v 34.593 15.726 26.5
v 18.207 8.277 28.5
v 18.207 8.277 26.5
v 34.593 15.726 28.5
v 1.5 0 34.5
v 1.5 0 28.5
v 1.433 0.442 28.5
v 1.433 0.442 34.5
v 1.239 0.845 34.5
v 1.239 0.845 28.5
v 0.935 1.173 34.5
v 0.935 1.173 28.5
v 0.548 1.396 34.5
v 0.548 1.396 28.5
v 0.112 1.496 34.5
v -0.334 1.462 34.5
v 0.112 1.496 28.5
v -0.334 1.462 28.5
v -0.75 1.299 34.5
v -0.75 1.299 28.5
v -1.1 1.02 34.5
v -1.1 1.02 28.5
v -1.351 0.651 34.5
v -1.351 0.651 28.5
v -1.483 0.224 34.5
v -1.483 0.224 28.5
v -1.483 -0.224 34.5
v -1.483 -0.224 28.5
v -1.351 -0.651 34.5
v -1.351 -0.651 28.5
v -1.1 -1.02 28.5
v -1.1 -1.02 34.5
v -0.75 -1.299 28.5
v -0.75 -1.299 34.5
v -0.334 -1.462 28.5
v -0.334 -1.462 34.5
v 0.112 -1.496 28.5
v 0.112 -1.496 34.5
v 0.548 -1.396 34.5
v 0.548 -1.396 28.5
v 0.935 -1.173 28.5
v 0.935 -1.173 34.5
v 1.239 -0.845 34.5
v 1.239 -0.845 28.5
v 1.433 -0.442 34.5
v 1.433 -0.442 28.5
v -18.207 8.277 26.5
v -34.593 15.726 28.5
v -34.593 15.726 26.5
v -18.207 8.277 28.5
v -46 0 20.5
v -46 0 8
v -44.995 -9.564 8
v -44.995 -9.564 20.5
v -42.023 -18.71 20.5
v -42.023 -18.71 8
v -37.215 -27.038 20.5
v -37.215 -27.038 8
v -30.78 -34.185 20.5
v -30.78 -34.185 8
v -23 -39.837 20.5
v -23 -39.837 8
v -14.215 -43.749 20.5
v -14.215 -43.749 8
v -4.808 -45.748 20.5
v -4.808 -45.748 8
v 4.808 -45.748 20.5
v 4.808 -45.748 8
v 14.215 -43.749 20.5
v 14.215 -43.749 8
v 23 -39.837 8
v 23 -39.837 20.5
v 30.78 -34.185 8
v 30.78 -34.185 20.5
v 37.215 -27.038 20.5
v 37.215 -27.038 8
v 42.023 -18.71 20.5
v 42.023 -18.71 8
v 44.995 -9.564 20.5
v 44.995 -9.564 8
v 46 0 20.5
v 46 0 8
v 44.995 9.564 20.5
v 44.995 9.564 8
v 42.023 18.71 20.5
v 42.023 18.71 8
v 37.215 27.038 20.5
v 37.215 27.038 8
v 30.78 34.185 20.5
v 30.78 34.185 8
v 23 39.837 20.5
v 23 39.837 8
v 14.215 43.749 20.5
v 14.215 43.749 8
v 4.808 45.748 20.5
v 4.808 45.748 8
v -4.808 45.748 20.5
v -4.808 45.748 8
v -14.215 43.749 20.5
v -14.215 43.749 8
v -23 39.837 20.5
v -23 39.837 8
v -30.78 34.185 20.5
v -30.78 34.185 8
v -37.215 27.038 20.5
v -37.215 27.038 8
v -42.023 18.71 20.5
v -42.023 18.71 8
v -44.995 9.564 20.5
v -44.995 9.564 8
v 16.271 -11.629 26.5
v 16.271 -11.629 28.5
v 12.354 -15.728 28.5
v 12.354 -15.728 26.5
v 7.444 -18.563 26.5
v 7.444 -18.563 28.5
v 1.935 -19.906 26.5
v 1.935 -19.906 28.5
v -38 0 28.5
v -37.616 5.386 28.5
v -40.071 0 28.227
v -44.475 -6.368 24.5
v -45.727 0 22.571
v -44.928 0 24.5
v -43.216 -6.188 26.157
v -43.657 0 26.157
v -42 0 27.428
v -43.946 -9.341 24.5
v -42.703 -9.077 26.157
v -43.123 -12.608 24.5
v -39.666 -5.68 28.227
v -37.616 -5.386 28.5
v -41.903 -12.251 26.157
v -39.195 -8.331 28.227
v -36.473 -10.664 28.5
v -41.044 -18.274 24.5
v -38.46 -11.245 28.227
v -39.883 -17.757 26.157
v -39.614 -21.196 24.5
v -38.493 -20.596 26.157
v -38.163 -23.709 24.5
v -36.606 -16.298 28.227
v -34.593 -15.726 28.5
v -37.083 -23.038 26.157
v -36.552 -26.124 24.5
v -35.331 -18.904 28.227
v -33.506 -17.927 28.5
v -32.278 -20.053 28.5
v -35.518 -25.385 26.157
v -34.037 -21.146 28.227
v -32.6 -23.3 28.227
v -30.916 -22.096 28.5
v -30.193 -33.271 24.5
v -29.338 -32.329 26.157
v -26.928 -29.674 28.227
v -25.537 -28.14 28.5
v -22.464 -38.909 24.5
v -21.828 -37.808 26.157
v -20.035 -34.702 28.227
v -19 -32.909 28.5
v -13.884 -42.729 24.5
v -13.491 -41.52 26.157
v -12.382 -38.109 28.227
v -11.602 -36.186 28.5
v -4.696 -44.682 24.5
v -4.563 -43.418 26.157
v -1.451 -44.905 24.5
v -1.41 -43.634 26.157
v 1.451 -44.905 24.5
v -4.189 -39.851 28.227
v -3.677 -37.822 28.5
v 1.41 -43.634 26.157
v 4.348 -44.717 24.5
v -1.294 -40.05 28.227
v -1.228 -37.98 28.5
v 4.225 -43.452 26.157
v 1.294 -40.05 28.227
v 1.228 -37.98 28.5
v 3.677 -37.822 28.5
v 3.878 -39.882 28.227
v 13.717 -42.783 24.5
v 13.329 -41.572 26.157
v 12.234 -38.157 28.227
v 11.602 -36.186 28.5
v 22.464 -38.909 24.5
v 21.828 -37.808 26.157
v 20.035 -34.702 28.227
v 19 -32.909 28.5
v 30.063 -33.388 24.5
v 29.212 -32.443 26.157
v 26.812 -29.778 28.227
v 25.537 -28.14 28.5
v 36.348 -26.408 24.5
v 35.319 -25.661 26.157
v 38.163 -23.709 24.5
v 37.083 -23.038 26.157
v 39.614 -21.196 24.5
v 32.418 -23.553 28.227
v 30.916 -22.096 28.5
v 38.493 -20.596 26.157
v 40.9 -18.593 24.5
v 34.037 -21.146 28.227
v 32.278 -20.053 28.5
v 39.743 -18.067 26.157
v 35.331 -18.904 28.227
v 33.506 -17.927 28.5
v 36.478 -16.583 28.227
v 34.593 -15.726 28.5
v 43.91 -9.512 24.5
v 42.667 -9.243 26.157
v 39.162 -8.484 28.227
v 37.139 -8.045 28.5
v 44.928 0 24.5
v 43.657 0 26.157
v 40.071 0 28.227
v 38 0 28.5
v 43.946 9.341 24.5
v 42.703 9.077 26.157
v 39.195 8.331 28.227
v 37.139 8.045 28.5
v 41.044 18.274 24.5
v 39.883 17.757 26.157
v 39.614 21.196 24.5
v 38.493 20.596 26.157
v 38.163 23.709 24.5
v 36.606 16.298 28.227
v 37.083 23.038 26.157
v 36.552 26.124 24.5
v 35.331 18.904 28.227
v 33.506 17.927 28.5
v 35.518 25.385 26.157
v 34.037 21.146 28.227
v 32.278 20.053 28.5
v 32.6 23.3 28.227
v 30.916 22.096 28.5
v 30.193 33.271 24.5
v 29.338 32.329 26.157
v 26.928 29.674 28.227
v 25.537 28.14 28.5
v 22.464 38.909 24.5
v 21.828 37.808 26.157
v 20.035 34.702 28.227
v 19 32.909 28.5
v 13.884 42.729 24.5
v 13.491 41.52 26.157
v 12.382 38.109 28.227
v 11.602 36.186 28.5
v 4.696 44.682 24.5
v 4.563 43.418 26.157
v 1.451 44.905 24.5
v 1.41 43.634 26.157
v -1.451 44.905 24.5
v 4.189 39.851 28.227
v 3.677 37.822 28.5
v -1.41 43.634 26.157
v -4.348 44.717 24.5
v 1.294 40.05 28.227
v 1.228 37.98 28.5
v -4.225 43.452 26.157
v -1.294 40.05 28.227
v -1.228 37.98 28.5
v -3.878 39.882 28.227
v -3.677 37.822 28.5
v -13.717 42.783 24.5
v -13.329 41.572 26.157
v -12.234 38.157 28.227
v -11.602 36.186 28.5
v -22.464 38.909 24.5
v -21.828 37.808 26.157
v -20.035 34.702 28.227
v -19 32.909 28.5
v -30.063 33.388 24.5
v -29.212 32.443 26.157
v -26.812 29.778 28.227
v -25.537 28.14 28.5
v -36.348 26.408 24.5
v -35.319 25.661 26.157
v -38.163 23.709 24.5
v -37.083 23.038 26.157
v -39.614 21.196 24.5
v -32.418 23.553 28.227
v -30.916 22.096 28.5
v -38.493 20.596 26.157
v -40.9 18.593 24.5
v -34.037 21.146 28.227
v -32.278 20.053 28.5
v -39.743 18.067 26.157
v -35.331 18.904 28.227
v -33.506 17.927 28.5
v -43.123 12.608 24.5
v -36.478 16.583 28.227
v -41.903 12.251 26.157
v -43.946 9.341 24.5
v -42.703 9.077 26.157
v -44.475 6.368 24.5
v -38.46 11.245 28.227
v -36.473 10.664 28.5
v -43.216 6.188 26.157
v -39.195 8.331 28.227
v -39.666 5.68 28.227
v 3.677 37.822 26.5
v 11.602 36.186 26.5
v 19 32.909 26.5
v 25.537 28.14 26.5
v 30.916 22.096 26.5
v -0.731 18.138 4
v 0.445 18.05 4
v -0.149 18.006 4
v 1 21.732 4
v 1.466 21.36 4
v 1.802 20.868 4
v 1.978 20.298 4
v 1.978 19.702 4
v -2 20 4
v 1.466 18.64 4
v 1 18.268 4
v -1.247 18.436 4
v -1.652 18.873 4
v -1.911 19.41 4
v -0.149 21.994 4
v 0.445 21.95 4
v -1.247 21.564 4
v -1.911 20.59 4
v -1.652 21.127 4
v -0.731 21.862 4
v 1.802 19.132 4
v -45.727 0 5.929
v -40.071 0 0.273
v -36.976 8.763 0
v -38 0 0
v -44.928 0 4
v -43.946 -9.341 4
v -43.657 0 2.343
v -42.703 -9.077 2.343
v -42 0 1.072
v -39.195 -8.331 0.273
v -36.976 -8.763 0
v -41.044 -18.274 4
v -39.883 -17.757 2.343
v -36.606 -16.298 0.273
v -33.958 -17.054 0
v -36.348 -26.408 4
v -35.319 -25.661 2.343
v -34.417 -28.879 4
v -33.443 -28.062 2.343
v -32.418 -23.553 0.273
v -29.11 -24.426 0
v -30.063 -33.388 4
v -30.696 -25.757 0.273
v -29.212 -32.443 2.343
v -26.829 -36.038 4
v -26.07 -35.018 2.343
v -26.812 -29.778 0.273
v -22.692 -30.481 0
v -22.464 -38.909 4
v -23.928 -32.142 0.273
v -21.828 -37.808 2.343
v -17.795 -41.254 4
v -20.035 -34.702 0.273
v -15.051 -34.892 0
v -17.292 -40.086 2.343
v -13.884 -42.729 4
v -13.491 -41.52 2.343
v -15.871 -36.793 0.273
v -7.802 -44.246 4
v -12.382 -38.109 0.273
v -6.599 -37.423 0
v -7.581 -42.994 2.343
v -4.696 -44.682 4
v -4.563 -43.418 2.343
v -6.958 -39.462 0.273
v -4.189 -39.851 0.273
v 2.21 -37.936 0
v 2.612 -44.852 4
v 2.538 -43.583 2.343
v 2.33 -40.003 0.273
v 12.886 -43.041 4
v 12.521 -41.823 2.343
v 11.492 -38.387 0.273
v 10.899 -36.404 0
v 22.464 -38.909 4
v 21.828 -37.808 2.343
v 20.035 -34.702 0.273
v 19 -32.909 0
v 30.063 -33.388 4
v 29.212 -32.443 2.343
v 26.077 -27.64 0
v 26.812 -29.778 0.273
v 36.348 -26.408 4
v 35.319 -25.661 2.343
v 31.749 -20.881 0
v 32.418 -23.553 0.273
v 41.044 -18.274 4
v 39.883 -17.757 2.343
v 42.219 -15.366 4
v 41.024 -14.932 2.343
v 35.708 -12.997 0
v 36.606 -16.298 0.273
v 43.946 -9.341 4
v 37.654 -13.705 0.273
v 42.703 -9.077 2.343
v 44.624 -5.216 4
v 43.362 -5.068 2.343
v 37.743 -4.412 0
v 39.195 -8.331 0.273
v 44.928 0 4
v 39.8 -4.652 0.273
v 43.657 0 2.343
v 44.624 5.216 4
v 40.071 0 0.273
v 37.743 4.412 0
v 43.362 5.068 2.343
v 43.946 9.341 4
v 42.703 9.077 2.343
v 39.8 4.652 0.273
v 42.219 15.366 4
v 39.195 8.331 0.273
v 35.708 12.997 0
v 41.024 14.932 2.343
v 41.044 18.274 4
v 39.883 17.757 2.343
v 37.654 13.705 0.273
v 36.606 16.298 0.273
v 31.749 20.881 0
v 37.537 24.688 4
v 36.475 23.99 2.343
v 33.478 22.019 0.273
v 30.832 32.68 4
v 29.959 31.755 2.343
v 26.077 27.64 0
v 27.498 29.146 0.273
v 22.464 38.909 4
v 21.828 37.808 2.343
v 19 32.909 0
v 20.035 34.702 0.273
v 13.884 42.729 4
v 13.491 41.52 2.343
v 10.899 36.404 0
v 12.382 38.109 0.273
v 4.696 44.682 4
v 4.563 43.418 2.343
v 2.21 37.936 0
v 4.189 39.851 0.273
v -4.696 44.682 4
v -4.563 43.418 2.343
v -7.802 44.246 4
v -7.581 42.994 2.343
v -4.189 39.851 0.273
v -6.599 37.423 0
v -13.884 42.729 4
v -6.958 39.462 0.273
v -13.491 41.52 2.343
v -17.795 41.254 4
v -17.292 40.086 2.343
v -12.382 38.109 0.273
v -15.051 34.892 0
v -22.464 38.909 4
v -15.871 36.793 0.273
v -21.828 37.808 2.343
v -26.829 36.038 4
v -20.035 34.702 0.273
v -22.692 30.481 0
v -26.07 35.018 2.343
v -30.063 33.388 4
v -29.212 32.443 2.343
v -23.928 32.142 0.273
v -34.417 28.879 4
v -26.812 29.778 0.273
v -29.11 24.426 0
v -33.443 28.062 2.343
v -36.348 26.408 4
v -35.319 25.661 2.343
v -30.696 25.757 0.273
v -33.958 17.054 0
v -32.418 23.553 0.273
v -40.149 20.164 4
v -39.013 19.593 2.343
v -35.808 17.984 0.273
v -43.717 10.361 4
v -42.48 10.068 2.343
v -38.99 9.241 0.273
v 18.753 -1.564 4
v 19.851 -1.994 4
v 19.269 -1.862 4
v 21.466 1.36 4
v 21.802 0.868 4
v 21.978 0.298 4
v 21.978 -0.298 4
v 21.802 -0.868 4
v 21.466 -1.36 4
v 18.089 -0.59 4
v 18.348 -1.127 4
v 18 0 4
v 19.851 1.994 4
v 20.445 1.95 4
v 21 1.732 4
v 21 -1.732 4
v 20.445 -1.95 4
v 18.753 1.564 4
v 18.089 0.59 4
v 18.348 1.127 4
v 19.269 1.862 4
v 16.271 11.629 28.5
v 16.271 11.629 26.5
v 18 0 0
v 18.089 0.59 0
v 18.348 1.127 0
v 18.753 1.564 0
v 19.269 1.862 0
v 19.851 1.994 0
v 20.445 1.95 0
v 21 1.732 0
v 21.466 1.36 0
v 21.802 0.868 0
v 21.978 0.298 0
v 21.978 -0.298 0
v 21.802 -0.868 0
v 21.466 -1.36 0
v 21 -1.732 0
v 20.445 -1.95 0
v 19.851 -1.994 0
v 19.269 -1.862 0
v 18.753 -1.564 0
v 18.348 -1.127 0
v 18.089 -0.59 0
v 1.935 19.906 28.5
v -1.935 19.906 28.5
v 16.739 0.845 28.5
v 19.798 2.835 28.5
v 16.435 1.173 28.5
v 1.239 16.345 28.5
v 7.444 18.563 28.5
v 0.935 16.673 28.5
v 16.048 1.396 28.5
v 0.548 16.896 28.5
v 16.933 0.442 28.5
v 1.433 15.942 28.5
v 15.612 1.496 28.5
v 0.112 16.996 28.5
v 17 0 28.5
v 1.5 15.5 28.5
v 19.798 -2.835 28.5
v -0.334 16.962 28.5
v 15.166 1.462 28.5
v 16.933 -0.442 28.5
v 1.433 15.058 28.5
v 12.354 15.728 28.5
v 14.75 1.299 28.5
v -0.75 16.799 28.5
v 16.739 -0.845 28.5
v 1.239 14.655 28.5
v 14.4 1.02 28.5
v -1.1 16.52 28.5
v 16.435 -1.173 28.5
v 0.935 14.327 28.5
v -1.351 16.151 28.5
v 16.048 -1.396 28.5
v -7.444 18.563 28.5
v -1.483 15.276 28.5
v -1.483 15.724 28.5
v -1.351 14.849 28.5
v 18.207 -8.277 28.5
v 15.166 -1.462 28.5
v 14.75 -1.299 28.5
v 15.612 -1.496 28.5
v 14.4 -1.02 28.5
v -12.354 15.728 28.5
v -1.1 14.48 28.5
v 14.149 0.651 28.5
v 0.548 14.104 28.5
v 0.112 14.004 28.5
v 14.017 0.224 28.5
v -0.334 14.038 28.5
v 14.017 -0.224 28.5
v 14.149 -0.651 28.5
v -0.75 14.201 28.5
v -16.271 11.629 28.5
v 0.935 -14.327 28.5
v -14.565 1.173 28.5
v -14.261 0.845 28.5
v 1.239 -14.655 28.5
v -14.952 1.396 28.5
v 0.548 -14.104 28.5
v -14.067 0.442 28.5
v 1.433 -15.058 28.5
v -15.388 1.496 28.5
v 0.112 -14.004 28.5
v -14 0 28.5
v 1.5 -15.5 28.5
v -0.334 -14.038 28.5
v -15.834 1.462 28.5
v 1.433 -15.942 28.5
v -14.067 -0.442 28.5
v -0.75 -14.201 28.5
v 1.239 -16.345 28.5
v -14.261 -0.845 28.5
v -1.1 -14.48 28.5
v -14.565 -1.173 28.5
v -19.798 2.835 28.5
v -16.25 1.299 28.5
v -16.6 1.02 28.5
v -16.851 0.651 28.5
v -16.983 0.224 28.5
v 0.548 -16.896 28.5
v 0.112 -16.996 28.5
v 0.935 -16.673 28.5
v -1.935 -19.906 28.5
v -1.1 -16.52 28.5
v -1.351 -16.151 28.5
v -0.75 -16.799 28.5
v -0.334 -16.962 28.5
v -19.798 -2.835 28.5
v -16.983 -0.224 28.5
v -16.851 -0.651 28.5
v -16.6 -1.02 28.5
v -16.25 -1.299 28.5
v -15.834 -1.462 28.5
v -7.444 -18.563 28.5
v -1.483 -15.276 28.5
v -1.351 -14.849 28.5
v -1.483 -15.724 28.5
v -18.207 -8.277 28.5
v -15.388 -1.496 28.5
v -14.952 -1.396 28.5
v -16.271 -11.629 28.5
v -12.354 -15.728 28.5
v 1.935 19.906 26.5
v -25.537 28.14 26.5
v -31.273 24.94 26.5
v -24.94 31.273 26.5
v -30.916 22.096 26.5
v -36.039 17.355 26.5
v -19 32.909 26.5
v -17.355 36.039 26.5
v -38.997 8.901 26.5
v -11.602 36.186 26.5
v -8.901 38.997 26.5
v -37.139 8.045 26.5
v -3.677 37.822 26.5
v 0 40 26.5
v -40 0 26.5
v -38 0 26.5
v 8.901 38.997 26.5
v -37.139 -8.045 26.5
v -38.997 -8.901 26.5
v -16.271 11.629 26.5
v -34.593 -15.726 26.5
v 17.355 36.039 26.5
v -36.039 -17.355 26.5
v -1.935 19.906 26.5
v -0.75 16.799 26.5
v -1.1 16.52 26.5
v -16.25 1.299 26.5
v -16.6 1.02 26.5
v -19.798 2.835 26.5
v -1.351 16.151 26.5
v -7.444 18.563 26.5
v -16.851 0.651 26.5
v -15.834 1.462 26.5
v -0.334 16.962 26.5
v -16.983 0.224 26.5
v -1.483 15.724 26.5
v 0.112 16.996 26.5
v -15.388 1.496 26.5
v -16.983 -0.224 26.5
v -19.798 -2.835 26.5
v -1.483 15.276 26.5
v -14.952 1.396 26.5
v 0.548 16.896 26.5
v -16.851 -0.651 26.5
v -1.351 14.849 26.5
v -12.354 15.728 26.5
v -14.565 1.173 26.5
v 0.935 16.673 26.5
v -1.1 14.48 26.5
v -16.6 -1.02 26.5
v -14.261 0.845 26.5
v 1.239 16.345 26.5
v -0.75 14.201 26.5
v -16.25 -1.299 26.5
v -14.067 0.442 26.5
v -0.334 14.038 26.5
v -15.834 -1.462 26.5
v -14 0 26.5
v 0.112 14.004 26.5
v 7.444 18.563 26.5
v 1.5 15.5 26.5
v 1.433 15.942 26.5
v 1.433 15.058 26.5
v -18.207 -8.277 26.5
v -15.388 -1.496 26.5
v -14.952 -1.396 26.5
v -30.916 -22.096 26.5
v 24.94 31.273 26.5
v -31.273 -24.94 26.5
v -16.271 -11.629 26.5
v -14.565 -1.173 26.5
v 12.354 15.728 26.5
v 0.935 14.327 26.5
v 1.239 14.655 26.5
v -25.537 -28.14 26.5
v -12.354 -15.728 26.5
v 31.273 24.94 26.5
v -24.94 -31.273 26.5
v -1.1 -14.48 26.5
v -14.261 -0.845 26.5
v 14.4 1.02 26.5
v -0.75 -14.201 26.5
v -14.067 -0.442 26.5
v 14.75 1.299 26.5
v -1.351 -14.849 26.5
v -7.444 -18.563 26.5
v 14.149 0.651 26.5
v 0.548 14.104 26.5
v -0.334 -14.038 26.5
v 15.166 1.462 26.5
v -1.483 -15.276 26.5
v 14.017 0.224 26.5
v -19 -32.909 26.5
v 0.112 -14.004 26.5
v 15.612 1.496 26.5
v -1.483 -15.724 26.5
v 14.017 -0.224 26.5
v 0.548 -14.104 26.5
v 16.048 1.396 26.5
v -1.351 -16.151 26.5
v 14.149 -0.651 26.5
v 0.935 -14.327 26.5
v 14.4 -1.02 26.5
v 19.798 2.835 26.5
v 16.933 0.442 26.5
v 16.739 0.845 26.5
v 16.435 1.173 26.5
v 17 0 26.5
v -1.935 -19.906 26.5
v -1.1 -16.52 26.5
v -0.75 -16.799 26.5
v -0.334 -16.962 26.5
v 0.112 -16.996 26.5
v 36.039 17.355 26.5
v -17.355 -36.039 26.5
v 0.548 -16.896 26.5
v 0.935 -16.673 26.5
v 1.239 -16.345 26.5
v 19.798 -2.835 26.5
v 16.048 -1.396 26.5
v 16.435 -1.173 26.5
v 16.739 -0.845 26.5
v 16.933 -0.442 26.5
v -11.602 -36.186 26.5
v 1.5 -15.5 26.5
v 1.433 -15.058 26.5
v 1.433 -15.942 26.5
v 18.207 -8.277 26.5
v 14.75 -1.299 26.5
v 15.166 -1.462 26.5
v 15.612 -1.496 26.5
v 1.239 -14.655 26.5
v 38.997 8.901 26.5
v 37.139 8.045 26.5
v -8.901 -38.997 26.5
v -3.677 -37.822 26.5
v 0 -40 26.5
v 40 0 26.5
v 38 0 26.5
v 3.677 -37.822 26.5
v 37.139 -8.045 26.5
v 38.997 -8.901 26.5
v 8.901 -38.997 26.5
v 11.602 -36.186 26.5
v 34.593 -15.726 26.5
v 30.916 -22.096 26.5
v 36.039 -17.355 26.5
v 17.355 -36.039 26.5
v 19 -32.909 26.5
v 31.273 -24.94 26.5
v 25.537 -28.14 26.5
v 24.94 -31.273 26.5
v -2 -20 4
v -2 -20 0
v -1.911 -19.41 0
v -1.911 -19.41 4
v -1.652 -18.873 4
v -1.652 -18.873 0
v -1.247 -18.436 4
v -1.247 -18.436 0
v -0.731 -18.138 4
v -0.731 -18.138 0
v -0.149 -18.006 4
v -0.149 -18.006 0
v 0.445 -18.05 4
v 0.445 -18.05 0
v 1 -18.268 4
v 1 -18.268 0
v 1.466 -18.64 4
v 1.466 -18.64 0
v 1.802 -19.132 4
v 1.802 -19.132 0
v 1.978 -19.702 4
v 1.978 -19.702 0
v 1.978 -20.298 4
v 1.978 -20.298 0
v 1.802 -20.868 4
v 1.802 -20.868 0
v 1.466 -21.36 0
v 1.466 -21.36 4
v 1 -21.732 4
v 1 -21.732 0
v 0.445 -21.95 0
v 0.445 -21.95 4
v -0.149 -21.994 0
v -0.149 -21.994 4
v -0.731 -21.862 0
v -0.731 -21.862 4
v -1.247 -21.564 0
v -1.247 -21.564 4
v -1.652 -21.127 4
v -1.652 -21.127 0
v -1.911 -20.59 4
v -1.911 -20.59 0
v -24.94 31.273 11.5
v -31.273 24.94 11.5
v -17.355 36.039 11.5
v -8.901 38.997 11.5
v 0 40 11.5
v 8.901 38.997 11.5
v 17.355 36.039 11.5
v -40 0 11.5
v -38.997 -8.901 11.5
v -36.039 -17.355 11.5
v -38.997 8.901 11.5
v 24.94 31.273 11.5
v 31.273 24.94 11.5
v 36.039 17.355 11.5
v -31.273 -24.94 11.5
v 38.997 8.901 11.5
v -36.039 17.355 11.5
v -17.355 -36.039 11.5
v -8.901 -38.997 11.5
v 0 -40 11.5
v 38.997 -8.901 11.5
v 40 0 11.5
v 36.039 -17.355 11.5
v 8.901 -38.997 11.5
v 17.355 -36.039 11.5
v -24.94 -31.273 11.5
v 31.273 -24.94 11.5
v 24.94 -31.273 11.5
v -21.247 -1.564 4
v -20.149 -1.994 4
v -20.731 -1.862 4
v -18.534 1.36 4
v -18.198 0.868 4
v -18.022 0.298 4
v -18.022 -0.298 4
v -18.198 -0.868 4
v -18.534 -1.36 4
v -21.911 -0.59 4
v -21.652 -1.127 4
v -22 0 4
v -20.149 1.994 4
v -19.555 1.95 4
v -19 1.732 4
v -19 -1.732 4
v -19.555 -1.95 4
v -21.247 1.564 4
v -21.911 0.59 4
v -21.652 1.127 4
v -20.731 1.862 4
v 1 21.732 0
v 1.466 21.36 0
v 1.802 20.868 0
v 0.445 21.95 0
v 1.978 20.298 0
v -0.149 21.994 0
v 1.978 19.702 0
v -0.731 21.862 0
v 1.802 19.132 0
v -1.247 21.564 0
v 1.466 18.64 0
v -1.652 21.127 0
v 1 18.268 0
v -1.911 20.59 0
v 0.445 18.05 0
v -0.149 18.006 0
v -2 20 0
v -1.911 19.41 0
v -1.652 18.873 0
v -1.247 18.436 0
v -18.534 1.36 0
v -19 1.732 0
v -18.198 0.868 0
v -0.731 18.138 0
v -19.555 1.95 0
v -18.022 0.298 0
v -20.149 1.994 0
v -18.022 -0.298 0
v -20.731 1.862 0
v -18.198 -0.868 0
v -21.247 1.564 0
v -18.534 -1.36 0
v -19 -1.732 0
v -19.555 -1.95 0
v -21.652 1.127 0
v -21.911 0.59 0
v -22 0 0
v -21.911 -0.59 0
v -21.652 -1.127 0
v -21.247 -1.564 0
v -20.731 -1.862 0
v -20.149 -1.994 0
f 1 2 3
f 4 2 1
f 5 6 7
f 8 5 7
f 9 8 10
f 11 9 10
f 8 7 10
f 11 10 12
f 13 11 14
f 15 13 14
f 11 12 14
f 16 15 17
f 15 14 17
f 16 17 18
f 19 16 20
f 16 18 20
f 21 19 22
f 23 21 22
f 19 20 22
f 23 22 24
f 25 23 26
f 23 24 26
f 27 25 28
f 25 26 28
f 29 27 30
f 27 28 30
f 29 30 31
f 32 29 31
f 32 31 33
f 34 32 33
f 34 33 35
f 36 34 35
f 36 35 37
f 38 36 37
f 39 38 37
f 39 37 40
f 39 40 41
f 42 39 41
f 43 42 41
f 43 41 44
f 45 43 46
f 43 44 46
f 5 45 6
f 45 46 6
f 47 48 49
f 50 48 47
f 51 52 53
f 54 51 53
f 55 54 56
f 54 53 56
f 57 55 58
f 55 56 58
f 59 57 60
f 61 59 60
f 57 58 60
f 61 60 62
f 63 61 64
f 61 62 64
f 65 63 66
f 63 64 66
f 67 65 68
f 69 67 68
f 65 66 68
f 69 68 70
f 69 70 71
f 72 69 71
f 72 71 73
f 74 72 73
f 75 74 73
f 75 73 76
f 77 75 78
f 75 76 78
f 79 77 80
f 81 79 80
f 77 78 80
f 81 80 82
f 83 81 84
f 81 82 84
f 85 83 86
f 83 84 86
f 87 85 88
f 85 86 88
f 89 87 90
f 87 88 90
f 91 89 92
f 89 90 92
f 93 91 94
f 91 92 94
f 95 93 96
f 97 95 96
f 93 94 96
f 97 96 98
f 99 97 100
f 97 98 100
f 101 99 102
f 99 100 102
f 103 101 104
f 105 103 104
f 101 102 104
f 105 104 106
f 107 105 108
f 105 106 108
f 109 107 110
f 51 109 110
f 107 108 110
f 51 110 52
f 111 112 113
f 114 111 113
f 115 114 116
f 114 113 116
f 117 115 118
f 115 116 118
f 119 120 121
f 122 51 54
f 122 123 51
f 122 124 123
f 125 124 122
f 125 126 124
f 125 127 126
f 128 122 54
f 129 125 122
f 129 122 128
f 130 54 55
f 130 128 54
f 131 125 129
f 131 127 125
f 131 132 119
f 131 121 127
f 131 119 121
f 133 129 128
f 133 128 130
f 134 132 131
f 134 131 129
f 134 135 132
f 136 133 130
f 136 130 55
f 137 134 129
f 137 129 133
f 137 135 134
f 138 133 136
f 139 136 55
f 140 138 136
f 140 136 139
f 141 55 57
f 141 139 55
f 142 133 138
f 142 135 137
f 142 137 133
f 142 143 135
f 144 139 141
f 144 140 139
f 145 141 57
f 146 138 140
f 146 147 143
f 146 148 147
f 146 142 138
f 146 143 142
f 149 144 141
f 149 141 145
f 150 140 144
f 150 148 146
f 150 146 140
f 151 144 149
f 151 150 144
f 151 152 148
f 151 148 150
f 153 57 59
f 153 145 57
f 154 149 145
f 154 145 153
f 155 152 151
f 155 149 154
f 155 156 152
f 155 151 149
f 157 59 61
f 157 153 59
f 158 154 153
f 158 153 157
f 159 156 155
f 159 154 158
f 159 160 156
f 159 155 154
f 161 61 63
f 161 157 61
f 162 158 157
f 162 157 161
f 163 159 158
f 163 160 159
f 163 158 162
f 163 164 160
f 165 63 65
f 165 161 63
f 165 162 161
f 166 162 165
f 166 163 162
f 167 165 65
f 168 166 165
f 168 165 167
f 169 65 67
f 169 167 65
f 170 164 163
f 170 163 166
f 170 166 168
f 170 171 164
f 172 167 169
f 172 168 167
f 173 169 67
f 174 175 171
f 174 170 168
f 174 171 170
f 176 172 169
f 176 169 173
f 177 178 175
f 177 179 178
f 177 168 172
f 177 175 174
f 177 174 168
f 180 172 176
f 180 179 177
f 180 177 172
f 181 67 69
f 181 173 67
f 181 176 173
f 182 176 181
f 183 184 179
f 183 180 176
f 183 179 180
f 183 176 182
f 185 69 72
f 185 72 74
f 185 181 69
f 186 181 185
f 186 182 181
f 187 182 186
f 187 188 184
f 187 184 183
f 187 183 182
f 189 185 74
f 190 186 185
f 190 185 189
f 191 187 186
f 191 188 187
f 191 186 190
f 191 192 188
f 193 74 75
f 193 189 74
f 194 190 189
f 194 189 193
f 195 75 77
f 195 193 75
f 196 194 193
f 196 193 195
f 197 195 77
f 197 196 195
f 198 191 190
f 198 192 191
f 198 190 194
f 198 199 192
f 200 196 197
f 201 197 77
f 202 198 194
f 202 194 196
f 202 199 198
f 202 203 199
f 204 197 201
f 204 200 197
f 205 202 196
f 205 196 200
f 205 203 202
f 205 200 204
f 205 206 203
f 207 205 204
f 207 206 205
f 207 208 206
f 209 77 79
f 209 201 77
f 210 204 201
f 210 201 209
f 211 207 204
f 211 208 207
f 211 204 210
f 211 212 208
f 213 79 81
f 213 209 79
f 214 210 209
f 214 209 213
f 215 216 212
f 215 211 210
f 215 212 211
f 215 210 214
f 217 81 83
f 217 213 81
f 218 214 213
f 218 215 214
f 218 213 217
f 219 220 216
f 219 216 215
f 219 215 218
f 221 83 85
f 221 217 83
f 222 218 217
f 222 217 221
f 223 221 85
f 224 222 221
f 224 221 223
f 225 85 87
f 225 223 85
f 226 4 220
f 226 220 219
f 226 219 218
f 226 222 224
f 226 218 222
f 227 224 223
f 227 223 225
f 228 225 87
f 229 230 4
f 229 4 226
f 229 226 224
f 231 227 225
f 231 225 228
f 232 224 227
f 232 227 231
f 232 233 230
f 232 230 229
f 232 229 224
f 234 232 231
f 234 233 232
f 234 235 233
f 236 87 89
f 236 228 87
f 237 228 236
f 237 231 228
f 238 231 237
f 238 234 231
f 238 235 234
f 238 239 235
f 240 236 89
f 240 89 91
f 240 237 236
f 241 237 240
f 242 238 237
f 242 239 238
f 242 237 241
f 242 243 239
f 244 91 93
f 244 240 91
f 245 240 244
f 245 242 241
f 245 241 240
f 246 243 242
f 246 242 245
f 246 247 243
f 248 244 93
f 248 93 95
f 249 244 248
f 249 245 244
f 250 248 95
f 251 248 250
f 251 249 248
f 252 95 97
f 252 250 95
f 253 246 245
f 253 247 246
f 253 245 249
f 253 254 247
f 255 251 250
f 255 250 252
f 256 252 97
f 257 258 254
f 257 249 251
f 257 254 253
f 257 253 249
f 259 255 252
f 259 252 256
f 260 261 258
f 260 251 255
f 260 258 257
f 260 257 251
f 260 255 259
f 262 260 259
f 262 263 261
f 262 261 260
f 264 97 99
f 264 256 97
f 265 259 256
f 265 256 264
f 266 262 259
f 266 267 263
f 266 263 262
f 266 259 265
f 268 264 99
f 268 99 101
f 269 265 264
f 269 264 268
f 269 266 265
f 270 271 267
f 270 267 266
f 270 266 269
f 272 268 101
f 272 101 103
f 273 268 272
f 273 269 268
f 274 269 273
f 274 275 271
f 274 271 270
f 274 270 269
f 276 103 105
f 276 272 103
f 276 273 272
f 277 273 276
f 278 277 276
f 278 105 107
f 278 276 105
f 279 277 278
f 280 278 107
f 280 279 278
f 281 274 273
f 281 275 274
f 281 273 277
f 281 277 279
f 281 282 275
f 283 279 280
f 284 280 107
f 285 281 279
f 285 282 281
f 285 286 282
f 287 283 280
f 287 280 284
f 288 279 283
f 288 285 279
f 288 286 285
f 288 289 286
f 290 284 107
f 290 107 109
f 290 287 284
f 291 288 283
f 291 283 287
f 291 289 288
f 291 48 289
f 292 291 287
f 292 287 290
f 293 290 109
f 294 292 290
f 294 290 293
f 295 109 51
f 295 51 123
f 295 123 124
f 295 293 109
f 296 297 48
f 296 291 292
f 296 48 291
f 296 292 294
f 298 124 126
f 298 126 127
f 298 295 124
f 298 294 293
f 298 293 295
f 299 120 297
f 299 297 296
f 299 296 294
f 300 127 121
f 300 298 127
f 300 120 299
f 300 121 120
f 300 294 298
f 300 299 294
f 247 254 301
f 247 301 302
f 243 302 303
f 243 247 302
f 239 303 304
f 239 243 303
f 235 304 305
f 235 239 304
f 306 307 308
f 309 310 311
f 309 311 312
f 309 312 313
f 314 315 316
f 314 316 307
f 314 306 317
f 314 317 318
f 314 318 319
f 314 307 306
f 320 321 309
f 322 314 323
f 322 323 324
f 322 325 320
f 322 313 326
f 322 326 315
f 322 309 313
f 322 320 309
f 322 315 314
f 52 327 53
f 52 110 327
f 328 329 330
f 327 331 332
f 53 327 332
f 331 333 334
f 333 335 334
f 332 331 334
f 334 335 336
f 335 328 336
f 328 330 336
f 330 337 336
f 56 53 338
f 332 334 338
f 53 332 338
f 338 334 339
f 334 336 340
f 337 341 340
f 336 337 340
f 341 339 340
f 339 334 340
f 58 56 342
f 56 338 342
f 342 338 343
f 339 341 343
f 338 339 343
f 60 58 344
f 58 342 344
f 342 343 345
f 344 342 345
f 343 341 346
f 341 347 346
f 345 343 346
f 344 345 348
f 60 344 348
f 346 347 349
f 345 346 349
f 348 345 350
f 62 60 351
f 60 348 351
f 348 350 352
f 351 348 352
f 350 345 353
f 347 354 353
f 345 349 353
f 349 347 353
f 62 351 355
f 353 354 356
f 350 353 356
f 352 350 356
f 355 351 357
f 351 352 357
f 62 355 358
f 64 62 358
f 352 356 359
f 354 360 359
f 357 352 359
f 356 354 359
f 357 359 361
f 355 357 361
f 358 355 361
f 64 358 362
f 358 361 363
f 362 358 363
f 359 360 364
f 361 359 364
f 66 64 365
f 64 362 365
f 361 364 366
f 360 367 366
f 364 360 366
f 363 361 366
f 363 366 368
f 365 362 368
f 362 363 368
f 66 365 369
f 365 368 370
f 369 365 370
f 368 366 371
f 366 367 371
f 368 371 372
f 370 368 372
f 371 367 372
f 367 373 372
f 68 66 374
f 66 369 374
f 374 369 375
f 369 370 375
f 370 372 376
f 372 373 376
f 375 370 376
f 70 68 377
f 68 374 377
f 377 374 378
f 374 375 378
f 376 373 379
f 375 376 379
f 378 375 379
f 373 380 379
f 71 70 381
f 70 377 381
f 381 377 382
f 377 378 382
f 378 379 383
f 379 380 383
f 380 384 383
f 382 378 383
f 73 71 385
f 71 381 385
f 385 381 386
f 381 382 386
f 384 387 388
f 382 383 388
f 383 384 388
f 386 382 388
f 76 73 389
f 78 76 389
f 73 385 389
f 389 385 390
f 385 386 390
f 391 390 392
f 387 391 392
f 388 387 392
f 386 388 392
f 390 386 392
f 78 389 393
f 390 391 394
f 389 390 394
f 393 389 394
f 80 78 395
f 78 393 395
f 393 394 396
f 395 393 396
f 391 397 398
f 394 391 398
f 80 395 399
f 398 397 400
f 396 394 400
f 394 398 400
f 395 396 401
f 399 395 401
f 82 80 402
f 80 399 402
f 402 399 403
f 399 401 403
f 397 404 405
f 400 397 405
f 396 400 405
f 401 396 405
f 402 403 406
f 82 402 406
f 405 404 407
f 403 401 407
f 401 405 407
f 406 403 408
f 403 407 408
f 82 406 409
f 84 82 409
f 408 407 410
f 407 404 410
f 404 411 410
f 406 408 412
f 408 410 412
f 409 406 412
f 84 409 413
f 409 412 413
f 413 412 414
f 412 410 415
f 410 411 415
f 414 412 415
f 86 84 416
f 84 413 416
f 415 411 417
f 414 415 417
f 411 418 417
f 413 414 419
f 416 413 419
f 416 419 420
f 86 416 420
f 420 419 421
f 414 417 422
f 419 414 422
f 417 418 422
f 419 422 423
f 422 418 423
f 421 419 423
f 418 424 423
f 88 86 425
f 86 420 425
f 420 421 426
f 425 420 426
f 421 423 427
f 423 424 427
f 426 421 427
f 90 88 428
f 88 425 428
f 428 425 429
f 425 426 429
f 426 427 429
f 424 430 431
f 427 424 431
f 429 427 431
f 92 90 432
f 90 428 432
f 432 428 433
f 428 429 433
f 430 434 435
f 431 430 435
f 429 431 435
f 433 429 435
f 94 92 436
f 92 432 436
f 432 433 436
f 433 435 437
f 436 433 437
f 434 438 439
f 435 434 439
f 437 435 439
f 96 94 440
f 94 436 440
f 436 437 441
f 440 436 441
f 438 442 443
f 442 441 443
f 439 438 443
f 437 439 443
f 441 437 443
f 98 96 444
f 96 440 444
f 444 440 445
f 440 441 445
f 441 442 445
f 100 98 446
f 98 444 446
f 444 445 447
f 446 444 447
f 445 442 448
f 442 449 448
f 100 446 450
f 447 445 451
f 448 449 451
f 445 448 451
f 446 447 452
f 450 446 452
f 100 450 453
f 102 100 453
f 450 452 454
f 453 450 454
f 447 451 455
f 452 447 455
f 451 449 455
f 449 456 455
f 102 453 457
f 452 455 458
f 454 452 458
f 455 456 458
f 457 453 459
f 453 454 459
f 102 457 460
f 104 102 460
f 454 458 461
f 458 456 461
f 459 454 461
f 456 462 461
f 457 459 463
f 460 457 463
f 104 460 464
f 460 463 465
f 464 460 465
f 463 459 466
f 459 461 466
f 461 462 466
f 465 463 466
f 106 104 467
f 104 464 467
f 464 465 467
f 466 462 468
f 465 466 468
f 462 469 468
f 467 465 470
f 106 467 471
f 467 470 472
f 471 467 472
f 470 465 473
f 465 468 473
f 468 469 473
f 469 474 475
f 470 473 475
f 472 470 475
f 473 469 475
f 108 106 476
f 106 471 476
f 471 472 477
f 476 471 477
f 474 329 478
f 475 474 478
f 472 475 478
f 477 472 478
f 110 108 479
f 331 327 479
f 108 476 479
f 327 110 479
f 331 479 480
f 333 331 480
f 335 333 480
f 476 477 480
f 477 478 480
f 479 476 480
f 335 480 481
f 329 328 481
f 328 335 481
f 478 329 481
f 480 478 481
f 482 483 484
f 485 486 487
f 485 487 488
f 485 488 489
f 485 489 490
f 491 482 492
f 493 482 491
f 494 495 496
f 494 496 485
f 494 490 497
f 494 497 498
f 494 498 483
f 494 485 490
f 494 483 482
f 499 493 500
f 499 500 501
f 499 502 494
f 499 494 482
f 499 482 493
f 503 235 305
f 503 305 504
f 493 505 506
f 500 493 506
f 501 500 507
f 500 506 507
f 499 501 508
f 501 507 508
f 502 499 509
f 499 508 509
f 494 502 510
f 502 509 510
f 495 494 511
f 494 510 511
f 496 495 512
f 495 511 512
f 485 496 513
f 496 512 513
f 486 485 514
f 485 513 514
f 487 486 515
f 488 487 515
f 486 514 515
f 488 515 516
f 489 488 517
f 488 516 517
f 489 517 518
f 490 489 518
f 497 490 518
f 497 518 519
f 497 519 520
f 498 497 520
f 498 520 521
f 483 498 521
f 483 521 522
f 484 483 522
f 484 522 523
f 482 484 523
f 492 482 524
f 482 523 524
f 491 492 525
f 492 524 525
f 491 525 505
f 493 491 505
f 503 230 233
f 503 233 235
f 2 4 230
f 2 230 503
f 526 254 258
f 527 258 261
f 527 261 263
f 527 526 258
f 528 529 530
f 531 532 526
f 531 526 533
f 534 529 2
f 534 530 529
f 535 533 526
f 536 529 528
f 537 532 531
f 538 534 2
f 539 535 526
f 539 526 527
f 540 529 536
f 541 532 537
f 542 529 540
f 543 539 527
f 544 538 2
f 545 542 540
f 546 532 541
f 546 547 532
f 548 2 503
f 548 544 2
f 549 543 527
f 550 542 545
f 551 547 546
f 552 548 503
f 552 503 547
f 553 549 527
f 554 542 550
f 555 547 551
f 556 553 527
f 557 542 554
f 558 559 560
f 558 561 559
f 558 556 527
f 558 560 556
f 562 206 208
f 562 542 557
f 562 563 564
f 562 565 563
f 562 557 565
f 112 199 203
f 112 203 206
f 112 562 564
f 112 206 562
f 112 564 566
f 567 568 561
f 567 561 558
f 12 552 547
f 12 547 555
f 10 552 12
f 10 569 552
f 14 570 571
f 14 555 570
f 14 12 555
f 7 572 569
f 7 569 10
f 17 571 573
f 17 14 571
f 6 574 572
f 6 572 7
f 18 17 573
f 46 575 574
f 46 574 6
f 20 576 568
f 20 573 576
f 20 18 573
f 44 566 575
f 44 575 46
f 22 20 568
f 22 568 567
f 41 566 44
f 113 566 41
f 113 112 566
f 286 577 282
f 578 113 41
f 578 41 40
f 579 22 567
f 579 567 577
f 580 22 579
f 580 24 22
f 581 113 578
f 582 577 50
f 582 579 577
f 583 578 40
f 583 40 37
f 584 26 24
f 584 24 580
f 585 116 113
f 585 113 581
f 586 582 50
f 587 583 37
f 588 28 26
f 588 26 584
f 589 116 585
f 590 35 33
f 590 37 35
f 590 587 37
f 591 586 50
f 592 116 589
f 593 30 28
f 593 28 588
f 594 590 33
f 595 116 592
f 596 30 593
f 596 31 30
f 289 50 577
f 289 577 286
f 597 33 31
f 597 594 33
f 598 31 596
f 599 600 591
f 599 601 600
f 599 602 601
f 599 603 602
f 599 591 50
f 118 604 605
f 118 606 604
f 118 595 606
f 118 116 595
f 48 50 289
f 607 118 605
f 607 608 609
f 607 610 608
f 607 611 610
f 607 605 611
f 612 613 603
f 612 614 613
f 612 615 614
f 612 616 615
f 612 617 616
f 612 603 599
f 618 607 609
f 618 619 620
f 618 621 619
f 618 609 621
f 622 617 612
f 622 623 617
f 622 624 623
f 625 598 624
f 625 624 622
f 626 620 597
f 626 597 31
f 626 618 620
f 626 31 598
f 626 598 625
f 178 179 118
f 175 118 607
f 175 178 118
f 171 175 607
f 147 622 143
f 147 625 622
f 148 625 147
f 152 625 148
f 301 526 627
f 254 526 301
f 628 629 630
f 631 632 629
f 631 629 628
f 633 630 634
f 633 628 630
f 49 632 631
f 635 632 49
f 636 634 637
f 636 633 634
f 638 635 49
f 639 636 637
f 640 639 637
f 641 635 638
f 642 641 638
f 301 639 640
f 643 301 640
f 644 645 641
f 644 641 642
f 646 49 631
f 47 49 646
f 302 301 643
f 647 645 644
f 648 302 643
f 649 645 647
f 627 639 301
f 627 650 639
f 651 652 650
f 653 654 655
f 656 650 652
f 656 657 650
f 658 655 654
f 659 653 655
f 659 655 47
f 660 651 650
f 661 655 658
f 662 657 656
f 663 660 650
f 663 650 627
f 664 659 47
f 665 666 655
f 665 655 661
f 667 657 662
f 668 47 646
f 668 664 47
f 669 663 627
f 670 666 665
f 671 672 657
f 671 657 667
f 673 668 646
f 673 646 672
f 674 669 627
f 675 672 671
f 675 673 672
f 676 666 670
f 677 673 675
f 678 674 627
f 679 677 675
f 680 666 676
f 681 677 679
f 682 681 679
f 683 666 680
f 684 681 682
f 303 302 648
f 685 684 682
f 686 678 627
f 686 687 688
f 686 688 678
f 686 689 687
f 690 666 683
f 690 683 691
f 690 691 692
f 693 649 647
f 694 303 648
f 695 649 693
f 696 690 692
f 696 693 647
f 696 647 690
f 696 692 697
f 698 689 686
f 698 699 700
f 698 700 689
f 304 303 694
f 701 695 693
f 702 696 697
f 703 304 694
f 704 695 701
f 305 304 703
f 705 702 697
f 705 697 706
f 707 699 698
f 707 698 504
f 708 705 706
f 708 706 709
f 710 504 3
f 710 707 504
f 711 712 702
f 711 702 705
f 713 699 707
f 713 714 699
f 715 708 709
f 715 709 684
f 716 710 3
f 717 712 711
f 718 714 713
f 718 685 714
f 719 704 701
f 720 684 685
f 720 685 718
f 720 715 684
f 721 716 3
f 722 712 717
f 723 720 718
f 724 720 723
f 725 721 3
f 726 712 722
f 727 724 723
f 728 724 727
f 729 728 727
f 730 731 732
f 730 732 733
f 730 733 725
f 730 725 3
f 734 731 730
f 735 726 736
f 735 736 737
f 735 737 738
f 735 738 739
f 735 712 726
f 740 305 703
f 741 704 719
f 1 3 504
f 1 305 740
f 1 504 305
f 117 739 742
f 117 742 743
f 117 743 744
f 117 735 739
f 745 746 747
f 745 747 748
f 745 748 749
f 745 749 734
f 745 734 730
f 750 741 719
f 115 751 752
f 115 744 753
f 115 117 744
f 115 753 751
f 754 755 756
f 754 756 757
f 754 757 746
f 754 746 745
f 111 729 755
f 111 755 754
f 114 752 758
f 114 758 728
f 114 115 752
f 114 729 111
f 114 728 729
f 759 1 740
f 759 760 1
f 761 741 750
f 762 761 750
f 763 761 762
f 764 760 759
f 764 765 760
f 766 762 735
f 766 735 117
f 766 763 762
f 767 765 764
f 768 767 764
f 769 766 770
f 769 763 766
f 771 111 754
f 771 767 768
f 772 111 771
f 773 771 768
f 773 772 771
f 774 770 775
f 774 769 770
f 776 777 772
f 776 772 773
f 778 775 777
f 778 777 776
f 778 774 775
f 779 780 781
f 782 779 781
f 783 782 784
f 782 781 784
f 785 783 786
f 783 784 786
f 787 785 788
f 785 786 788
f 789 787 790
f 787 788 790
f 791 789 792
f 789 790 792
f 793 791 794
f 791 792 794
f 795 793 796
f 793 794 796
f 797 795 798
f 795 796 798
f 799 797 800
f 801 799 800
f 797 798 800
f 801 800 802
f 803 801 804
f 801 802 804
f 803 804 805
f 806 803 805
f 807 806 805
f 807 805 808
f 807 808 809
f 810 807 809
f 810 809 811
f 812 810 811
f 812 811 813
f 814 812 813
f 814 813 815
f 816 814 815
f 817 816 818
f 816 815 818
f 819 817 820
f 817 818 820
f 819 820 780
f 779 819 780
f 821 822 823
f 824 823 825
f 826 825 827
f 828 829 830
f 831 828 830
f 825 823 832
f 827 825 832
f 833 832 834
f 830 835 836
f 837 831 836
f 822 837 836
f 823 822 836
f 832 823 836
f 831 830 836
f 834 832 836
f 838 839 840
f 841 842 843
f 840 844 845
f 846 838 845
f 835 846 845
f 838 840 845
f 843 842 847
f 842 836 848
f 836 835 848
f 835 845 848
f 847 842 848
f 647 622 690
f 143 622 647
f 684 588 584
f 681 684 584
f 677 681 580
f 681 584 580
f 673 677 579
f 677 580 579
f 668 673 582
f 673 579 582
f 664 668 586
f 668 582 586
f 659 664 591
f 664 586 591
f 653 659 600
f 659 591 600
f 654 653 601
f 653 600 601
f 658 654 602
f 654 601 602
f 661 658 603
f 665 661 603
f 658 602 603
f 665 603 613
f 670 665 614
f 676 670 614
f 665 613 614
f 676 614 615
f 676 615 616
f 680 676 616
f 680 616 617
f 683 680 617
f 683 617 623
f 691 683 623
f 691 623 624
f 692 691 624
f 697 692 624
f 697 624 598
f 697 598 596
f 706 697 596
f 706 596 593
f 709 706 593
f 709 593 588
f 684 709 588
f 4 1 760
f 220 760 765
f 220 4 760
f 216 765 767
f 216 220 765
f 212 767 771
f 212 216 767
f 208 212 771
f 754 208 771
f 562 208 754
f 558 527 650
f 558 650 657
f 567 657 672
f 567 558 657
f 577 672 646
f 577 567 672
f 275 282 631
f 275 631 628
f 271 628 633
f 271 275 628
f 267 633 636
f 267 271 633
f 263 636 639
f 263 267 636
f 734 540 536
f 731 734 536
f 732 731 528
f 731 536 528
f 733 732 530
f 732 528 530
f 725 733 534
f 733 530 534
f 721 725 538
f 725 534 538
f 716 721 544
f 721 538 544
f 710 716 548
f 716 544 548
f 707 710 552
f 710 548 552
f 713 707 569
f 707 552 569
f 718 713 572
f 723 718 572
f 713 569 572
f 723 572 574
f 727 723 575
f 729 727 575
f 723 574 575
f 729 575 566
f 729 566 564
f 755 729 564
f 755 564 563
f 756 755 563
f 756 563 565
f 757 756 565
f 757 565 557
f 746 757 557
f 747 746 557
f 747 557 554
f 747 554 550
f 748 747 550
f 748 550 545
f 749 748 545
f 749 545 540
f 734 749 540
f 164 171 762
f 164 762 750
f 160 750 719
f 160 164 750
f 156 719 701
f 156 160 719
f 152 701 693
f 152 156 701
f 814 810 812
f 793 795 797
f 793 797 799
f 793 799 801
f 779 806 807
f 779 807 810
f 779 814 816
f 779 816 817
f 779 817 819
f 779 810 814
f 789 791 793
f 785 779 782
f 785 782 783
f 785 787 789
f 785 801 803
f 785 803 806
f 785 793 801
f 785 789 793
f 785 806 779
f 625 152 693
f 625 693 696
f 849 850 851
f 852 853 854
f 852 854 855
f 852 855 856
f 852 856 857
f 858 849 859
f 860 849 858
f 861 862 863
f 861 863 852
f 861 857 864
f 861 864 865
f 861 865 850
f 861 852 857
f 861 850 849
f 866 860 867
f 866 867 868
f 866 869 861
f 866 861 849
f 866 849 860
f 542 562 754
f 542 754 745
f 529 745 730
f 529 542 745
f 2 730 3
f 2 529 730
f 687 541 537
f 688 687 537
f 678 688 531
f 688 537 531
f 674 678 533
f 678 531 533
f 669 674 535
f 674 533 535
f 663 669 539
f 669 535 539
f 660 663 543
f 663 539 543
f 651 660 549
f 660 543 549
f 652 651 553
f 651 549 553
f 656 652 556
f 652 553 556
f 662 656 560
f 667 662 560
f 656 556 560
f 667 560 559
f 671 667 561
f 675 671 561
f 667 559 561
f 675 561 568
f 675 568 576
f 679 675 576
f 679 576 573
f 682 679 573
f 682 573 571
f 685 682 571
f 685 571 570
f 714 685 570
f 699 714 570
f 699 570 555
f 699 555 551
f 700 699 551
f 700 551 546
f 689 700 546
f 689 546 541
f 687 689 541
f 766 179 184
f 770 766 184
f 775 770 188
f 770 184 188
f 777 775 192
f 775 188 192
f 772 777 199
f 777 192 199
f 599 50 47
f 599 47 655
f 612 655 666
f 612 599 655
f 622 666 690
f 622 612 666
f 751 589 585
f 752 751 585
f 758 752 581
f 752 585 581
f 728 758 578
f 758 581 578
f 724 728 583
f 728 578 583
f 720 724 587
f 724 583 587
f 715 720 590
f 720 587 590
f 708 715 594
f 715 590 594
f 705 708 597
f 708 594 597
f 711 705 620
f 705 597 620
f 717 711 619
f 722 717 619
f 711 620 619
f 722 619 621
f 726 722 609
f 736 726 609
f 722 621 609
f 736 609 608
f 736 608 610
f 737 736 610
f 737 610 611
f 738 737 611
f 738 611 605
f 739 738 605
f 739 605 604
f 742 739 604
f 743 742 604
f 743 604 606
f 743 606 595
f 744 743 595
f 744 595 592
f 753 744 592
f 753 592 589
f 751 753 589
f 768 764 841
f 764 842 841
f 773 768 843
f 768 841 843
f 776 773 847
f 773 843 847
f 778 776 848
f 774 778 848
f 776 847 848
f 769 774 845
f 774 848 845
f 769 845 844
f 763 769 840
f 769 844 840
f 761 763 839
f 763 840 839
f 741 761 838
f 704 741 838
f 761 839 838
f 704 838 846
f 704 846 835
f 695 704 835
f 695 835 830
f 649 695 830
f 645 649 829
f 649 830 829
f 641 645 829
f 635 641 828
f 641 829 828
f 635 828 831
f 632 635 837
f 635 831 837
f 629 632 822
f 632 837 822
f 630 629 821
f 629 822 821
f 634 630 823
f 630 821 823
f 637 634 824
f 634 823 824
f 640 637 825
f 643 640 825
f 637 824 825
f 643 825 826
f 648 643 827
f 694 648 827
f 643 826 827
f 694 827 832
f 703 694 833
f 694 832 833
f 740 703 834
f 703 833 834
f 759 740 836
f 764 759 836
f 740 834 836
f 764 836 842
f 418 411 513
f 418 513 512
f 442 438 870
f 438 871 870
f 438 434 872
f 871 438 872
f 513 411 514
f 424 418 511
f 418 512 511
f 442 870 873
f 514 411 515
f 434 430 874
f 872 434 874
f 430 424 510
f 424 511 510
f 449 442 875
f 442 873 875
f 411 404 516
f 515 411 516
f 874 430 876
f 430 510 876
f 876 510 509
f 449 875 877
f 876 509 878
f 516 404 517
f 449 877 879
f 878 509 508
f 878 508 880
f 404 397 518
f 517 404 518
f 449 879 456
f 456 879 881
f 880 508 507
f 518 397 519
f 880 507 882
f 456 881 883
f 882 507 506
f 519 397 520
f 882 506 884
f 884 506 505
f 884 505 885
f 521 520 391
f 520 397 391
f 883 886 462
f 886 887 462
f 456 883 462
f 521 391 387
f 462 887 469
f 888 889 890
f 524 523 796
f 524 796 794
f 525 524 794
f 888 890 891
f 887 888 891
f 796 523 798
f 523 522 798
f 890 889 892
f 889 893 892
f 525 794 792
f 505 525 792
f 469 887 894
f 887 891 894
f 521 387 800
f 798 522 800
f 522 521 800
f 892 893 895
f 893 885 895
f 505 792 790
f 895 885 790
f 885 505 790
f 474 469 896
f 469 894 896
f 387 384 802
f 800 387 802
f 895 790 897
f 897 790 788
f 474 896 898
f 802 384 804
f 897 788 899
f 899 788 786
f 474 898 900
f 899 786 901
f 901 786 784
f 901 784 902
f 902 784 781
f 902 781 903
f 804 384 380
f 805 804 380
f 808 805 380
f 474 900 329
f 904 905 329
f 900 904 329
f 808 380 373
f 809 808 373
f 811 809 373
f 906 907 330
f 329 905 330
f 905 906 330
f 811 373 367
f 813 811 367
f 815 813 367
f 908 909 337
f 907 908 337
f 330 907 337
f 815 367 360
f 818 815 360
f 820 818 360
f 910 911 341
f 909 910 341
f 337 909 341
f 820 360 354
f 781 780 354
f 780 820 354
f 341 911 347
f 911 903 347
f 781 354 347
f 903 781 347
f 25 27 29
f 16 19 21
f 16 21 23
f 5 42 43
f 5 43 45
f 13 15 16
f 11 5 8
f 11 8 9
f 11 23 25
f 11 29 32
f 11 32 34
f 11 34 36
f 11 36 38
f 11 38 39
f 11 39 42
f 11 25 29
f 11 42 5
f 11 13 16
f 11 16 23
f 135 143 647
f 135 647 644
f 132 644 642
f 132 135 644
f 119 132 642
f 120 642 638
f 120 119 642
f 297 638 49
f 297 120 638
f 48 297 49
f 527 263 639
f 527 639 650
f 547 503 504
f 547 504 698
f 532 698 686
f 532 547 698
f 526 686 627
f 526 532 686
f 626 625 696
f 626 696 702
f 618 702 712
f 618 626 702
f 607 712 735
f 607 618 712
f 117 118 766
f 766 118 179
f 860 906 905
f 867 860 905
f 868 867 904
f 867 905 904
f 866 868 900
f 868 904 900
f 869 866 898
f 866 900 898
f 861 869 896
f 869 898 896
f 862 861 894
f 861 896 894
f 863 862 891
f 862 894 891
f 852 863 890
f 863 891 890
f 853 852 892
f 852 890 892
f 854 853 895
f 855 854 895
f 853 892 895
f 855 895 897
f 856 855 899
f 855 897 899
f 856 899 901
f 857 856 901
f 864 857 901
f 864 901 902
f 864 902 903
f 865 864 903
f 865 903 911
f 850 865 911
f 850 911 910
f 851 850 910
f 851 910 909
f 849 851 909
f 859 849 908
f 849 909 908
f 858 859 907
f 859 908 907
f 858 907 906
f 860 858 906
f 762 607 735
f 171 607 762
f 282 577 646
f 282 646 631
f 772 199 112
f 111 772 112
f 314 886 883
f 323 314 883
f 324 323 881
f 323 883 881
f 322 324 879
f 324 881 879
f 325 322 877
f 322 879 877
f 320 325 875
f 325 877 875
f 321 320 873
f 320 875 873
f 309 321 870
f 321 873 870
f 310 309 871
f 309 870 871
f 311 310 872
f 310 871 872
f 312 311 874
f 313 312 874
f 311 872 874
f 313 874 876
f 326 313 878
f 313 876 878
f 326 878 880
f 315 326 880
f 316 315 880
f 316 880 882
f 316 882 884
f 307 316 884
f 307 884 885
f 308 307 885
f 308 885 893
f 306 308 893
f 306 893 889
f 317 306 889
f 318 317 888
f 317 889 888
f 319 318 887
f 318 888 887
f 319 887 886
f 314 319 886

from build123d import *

# Parameters (mm, degrees)
SKETCH_1_R          = 46
EXTRUDE_1_DEPTH     = 28.5
FILLET_1_R          = 8
SKETCH_2_R          = 1.5
CUT_EXTRUDE_1_DEPTH = 4
SKETCH_3_R          = 1.5
EXTRUDE_2_DEPTH     = 6
SKETCH_5_R          = 2
CUT_EXTRUDE_2_DEPTH = 4
CUT_EXTRUDE_3_DEPTH = 12
SKETCH_7_W          = 40
SKETCH_7_H          = 15


with BuildPart() as part:
    # 草图1 → 凸台-拉伸1 (new body)
    with BuildSketch(Plane.XY):
        with Locations(Location((0, 0, 0), (0, 0, 180))):
            Circle(SKETCH_1_R)
    extrude(amount=EXTRUDE_1_DEPTH)

    # 圆角1
    fillet_1_edges = [part.edges().sort_by_distance(p)[0] for p in [
        (46, 0, 0),
        (46, 0, 28.5),
    ]]
    fillet(fillet_1_edges, radius=FILLET_1_R)

    # 草图2 → 切除-拉伸1 (cut)
    with BuildSketch(Plane.XY.offset(28.5)):
        with Locations((0, -15.5)):
            Circle(SKETCH_2_R)
        with Locations((-15.5, 0)):
            Circle(SKETCH_2_R)
        with Locations((0, 15.5)):
            Circle(SKETCH_2_R)
        with Locations((15.5, 0)):
            Circle(SKETCH_2_R)
    extrude(amount=-CUT_EXTRUDE_1_DEPTH, mode=Mode.SUBTRACT)

    # 草图3 → 凸台-拉伸2 (add)
    with BuildSketch(Plane.XY.offset(28.5)):
        Circle(SKETCH_3_R)
    extrude(amount=EXTRUDE_2_DEPTH)

    # 草图5 → 切除-拉伸2 (cut)
    with BuildSketch(Plane(origin=(0, 0, 0), x_dir=(-1, 0, 0), z_dir=(0, 0, -1))):
        with Locations((-20, 0)):
            Circle(SKETCH_5_R)
        with Locations((0, 20)):
            Circle(SKETCH_5_R)
        with Locations((20, 0)):
            Circle(SKETCH_5_R)
        with Locations((0, -20)):
            Circle(SKETCH_5_R)
    extrude(amount=-CUT_EXTRUDE_2_DEPTH, mode=Mode.SUBTRACT)

    # 草图6 → 切除-拉伸3 (cut)
    with BuildSketch(Plane.XY.offset(28.5)):
        with BuildLine():
            Line((-1.935483871, -19.906127252), (-3.677419355, -37.821641779))
            ThreePointArc((-3.677419355, -37.821641779), (-19, -32.908965344), (-30.915792916, -22.095559471))
            Line((-30.915792916, -22.095559471), (-16.271469956, -11.629241827))
            ThreePointArc((-16.271469956, -11.629241827), (-10, -17.320508076), (-1.935483871, -19.906127252))
        make_face()
        with BuildLine():
            Line((1.935483871, -19.906127252), (3.677419355, -37.821641779))
            ThreePointArc((3.677419355, -37.821641779), (19, -32.908965344), (30.915792916, -22.095559471))
            Line((30.915792916, -22.095559471), (16.271469956, -11.629241827))
            ThreePointArc((16.271469956, -11.629241827), (10, -17.320508076), (1.935483871, -19.906127252))
        make_face()
        with BuildLine():
            Line((-18.206953827, -8.276885425), (-34.593212271, -15.726082308))
            ThreePointArc((-34.593212271, -15.726082308), (-38, 0), (-34.593212271, 15.726082308))
            Line((-34.593212271, 15.726082308), (-18.206953827, 8.276885425))
            ThreePointArc((-18.206953827, 8.276885425), (-19.999999876, 0), (-18.206953827, -8.276885425))
        make_face()
        with BuildLine():
            Line((-16.271469956, 11.629241827), (-30.915792916, 22.095559471))
            ThreePointArc((-30.915792916, 22.095559471), (-19, 32.908965344), (-3.677419355, 37.821641779))
            Line((-3.677419355, 37.821641779), (-1.935483871, 19.906127252))
            ThreePointArc((-1.935483871, 19.906127252), (-10, 17.320508076), (-16.271469956, 11.629241827))
        make_face()
        with BuildLine():
            Line((1.935483871, 19.906127252), (3.677419355, 37.821641779))
            ThreePointArc((3.677419355, 37.821641779), (19, 32.908965344), (30.915792916, 22.095559471))
            Line((30.915792916, 22.095559471), (16.271469956, 11.629241827))
            ThreePointArc((16.271469956, 11.629241827), (10, 17.320508076), (1.935483871, 19.906127252))
        make_face()
        with BuildLine():
            Line((18.206953827, 8.276885425), (34.593212271, 15.726082308))
            ThreePointArc((34.593212271, 15.726082308), (38, 0), (34.593212271, -15.726082308))
            Line((34.593212271, -15.726082308), (18.206953827, -8.276885425))
            ThreePointArc((18.206953827, -8.276885425), (20, 0), (18.206953827, 8.276885425))
        make_face()
    extrude(amount=-CUT_EXTRUDE_3_DEPTH, mode=Mode.SUBTRACT)

    # 草图7 → 切除-旋转1 (revolve, cut)
    with BuildSketch(Plane(origin=(0, 0, 0), x_dir=(1, 0, 0), z_dir=(0, 1, 0)), mode=Mode.PRIVATE) as cut_revolve_1_sk:
        with Locations((-20, -19)):
            Rectangle(SKETCH_7_W, SKETCH_7_H)
    revolve(cut_revolve_1_sk.sketch.rotate(Axis((0, 0, 28.5), (0, 0, -1)), 180), axis=Axis((0, 0, 28.5), (0, 0, -1)), mode=Mode.SUBTRACT)


solid = part.part
